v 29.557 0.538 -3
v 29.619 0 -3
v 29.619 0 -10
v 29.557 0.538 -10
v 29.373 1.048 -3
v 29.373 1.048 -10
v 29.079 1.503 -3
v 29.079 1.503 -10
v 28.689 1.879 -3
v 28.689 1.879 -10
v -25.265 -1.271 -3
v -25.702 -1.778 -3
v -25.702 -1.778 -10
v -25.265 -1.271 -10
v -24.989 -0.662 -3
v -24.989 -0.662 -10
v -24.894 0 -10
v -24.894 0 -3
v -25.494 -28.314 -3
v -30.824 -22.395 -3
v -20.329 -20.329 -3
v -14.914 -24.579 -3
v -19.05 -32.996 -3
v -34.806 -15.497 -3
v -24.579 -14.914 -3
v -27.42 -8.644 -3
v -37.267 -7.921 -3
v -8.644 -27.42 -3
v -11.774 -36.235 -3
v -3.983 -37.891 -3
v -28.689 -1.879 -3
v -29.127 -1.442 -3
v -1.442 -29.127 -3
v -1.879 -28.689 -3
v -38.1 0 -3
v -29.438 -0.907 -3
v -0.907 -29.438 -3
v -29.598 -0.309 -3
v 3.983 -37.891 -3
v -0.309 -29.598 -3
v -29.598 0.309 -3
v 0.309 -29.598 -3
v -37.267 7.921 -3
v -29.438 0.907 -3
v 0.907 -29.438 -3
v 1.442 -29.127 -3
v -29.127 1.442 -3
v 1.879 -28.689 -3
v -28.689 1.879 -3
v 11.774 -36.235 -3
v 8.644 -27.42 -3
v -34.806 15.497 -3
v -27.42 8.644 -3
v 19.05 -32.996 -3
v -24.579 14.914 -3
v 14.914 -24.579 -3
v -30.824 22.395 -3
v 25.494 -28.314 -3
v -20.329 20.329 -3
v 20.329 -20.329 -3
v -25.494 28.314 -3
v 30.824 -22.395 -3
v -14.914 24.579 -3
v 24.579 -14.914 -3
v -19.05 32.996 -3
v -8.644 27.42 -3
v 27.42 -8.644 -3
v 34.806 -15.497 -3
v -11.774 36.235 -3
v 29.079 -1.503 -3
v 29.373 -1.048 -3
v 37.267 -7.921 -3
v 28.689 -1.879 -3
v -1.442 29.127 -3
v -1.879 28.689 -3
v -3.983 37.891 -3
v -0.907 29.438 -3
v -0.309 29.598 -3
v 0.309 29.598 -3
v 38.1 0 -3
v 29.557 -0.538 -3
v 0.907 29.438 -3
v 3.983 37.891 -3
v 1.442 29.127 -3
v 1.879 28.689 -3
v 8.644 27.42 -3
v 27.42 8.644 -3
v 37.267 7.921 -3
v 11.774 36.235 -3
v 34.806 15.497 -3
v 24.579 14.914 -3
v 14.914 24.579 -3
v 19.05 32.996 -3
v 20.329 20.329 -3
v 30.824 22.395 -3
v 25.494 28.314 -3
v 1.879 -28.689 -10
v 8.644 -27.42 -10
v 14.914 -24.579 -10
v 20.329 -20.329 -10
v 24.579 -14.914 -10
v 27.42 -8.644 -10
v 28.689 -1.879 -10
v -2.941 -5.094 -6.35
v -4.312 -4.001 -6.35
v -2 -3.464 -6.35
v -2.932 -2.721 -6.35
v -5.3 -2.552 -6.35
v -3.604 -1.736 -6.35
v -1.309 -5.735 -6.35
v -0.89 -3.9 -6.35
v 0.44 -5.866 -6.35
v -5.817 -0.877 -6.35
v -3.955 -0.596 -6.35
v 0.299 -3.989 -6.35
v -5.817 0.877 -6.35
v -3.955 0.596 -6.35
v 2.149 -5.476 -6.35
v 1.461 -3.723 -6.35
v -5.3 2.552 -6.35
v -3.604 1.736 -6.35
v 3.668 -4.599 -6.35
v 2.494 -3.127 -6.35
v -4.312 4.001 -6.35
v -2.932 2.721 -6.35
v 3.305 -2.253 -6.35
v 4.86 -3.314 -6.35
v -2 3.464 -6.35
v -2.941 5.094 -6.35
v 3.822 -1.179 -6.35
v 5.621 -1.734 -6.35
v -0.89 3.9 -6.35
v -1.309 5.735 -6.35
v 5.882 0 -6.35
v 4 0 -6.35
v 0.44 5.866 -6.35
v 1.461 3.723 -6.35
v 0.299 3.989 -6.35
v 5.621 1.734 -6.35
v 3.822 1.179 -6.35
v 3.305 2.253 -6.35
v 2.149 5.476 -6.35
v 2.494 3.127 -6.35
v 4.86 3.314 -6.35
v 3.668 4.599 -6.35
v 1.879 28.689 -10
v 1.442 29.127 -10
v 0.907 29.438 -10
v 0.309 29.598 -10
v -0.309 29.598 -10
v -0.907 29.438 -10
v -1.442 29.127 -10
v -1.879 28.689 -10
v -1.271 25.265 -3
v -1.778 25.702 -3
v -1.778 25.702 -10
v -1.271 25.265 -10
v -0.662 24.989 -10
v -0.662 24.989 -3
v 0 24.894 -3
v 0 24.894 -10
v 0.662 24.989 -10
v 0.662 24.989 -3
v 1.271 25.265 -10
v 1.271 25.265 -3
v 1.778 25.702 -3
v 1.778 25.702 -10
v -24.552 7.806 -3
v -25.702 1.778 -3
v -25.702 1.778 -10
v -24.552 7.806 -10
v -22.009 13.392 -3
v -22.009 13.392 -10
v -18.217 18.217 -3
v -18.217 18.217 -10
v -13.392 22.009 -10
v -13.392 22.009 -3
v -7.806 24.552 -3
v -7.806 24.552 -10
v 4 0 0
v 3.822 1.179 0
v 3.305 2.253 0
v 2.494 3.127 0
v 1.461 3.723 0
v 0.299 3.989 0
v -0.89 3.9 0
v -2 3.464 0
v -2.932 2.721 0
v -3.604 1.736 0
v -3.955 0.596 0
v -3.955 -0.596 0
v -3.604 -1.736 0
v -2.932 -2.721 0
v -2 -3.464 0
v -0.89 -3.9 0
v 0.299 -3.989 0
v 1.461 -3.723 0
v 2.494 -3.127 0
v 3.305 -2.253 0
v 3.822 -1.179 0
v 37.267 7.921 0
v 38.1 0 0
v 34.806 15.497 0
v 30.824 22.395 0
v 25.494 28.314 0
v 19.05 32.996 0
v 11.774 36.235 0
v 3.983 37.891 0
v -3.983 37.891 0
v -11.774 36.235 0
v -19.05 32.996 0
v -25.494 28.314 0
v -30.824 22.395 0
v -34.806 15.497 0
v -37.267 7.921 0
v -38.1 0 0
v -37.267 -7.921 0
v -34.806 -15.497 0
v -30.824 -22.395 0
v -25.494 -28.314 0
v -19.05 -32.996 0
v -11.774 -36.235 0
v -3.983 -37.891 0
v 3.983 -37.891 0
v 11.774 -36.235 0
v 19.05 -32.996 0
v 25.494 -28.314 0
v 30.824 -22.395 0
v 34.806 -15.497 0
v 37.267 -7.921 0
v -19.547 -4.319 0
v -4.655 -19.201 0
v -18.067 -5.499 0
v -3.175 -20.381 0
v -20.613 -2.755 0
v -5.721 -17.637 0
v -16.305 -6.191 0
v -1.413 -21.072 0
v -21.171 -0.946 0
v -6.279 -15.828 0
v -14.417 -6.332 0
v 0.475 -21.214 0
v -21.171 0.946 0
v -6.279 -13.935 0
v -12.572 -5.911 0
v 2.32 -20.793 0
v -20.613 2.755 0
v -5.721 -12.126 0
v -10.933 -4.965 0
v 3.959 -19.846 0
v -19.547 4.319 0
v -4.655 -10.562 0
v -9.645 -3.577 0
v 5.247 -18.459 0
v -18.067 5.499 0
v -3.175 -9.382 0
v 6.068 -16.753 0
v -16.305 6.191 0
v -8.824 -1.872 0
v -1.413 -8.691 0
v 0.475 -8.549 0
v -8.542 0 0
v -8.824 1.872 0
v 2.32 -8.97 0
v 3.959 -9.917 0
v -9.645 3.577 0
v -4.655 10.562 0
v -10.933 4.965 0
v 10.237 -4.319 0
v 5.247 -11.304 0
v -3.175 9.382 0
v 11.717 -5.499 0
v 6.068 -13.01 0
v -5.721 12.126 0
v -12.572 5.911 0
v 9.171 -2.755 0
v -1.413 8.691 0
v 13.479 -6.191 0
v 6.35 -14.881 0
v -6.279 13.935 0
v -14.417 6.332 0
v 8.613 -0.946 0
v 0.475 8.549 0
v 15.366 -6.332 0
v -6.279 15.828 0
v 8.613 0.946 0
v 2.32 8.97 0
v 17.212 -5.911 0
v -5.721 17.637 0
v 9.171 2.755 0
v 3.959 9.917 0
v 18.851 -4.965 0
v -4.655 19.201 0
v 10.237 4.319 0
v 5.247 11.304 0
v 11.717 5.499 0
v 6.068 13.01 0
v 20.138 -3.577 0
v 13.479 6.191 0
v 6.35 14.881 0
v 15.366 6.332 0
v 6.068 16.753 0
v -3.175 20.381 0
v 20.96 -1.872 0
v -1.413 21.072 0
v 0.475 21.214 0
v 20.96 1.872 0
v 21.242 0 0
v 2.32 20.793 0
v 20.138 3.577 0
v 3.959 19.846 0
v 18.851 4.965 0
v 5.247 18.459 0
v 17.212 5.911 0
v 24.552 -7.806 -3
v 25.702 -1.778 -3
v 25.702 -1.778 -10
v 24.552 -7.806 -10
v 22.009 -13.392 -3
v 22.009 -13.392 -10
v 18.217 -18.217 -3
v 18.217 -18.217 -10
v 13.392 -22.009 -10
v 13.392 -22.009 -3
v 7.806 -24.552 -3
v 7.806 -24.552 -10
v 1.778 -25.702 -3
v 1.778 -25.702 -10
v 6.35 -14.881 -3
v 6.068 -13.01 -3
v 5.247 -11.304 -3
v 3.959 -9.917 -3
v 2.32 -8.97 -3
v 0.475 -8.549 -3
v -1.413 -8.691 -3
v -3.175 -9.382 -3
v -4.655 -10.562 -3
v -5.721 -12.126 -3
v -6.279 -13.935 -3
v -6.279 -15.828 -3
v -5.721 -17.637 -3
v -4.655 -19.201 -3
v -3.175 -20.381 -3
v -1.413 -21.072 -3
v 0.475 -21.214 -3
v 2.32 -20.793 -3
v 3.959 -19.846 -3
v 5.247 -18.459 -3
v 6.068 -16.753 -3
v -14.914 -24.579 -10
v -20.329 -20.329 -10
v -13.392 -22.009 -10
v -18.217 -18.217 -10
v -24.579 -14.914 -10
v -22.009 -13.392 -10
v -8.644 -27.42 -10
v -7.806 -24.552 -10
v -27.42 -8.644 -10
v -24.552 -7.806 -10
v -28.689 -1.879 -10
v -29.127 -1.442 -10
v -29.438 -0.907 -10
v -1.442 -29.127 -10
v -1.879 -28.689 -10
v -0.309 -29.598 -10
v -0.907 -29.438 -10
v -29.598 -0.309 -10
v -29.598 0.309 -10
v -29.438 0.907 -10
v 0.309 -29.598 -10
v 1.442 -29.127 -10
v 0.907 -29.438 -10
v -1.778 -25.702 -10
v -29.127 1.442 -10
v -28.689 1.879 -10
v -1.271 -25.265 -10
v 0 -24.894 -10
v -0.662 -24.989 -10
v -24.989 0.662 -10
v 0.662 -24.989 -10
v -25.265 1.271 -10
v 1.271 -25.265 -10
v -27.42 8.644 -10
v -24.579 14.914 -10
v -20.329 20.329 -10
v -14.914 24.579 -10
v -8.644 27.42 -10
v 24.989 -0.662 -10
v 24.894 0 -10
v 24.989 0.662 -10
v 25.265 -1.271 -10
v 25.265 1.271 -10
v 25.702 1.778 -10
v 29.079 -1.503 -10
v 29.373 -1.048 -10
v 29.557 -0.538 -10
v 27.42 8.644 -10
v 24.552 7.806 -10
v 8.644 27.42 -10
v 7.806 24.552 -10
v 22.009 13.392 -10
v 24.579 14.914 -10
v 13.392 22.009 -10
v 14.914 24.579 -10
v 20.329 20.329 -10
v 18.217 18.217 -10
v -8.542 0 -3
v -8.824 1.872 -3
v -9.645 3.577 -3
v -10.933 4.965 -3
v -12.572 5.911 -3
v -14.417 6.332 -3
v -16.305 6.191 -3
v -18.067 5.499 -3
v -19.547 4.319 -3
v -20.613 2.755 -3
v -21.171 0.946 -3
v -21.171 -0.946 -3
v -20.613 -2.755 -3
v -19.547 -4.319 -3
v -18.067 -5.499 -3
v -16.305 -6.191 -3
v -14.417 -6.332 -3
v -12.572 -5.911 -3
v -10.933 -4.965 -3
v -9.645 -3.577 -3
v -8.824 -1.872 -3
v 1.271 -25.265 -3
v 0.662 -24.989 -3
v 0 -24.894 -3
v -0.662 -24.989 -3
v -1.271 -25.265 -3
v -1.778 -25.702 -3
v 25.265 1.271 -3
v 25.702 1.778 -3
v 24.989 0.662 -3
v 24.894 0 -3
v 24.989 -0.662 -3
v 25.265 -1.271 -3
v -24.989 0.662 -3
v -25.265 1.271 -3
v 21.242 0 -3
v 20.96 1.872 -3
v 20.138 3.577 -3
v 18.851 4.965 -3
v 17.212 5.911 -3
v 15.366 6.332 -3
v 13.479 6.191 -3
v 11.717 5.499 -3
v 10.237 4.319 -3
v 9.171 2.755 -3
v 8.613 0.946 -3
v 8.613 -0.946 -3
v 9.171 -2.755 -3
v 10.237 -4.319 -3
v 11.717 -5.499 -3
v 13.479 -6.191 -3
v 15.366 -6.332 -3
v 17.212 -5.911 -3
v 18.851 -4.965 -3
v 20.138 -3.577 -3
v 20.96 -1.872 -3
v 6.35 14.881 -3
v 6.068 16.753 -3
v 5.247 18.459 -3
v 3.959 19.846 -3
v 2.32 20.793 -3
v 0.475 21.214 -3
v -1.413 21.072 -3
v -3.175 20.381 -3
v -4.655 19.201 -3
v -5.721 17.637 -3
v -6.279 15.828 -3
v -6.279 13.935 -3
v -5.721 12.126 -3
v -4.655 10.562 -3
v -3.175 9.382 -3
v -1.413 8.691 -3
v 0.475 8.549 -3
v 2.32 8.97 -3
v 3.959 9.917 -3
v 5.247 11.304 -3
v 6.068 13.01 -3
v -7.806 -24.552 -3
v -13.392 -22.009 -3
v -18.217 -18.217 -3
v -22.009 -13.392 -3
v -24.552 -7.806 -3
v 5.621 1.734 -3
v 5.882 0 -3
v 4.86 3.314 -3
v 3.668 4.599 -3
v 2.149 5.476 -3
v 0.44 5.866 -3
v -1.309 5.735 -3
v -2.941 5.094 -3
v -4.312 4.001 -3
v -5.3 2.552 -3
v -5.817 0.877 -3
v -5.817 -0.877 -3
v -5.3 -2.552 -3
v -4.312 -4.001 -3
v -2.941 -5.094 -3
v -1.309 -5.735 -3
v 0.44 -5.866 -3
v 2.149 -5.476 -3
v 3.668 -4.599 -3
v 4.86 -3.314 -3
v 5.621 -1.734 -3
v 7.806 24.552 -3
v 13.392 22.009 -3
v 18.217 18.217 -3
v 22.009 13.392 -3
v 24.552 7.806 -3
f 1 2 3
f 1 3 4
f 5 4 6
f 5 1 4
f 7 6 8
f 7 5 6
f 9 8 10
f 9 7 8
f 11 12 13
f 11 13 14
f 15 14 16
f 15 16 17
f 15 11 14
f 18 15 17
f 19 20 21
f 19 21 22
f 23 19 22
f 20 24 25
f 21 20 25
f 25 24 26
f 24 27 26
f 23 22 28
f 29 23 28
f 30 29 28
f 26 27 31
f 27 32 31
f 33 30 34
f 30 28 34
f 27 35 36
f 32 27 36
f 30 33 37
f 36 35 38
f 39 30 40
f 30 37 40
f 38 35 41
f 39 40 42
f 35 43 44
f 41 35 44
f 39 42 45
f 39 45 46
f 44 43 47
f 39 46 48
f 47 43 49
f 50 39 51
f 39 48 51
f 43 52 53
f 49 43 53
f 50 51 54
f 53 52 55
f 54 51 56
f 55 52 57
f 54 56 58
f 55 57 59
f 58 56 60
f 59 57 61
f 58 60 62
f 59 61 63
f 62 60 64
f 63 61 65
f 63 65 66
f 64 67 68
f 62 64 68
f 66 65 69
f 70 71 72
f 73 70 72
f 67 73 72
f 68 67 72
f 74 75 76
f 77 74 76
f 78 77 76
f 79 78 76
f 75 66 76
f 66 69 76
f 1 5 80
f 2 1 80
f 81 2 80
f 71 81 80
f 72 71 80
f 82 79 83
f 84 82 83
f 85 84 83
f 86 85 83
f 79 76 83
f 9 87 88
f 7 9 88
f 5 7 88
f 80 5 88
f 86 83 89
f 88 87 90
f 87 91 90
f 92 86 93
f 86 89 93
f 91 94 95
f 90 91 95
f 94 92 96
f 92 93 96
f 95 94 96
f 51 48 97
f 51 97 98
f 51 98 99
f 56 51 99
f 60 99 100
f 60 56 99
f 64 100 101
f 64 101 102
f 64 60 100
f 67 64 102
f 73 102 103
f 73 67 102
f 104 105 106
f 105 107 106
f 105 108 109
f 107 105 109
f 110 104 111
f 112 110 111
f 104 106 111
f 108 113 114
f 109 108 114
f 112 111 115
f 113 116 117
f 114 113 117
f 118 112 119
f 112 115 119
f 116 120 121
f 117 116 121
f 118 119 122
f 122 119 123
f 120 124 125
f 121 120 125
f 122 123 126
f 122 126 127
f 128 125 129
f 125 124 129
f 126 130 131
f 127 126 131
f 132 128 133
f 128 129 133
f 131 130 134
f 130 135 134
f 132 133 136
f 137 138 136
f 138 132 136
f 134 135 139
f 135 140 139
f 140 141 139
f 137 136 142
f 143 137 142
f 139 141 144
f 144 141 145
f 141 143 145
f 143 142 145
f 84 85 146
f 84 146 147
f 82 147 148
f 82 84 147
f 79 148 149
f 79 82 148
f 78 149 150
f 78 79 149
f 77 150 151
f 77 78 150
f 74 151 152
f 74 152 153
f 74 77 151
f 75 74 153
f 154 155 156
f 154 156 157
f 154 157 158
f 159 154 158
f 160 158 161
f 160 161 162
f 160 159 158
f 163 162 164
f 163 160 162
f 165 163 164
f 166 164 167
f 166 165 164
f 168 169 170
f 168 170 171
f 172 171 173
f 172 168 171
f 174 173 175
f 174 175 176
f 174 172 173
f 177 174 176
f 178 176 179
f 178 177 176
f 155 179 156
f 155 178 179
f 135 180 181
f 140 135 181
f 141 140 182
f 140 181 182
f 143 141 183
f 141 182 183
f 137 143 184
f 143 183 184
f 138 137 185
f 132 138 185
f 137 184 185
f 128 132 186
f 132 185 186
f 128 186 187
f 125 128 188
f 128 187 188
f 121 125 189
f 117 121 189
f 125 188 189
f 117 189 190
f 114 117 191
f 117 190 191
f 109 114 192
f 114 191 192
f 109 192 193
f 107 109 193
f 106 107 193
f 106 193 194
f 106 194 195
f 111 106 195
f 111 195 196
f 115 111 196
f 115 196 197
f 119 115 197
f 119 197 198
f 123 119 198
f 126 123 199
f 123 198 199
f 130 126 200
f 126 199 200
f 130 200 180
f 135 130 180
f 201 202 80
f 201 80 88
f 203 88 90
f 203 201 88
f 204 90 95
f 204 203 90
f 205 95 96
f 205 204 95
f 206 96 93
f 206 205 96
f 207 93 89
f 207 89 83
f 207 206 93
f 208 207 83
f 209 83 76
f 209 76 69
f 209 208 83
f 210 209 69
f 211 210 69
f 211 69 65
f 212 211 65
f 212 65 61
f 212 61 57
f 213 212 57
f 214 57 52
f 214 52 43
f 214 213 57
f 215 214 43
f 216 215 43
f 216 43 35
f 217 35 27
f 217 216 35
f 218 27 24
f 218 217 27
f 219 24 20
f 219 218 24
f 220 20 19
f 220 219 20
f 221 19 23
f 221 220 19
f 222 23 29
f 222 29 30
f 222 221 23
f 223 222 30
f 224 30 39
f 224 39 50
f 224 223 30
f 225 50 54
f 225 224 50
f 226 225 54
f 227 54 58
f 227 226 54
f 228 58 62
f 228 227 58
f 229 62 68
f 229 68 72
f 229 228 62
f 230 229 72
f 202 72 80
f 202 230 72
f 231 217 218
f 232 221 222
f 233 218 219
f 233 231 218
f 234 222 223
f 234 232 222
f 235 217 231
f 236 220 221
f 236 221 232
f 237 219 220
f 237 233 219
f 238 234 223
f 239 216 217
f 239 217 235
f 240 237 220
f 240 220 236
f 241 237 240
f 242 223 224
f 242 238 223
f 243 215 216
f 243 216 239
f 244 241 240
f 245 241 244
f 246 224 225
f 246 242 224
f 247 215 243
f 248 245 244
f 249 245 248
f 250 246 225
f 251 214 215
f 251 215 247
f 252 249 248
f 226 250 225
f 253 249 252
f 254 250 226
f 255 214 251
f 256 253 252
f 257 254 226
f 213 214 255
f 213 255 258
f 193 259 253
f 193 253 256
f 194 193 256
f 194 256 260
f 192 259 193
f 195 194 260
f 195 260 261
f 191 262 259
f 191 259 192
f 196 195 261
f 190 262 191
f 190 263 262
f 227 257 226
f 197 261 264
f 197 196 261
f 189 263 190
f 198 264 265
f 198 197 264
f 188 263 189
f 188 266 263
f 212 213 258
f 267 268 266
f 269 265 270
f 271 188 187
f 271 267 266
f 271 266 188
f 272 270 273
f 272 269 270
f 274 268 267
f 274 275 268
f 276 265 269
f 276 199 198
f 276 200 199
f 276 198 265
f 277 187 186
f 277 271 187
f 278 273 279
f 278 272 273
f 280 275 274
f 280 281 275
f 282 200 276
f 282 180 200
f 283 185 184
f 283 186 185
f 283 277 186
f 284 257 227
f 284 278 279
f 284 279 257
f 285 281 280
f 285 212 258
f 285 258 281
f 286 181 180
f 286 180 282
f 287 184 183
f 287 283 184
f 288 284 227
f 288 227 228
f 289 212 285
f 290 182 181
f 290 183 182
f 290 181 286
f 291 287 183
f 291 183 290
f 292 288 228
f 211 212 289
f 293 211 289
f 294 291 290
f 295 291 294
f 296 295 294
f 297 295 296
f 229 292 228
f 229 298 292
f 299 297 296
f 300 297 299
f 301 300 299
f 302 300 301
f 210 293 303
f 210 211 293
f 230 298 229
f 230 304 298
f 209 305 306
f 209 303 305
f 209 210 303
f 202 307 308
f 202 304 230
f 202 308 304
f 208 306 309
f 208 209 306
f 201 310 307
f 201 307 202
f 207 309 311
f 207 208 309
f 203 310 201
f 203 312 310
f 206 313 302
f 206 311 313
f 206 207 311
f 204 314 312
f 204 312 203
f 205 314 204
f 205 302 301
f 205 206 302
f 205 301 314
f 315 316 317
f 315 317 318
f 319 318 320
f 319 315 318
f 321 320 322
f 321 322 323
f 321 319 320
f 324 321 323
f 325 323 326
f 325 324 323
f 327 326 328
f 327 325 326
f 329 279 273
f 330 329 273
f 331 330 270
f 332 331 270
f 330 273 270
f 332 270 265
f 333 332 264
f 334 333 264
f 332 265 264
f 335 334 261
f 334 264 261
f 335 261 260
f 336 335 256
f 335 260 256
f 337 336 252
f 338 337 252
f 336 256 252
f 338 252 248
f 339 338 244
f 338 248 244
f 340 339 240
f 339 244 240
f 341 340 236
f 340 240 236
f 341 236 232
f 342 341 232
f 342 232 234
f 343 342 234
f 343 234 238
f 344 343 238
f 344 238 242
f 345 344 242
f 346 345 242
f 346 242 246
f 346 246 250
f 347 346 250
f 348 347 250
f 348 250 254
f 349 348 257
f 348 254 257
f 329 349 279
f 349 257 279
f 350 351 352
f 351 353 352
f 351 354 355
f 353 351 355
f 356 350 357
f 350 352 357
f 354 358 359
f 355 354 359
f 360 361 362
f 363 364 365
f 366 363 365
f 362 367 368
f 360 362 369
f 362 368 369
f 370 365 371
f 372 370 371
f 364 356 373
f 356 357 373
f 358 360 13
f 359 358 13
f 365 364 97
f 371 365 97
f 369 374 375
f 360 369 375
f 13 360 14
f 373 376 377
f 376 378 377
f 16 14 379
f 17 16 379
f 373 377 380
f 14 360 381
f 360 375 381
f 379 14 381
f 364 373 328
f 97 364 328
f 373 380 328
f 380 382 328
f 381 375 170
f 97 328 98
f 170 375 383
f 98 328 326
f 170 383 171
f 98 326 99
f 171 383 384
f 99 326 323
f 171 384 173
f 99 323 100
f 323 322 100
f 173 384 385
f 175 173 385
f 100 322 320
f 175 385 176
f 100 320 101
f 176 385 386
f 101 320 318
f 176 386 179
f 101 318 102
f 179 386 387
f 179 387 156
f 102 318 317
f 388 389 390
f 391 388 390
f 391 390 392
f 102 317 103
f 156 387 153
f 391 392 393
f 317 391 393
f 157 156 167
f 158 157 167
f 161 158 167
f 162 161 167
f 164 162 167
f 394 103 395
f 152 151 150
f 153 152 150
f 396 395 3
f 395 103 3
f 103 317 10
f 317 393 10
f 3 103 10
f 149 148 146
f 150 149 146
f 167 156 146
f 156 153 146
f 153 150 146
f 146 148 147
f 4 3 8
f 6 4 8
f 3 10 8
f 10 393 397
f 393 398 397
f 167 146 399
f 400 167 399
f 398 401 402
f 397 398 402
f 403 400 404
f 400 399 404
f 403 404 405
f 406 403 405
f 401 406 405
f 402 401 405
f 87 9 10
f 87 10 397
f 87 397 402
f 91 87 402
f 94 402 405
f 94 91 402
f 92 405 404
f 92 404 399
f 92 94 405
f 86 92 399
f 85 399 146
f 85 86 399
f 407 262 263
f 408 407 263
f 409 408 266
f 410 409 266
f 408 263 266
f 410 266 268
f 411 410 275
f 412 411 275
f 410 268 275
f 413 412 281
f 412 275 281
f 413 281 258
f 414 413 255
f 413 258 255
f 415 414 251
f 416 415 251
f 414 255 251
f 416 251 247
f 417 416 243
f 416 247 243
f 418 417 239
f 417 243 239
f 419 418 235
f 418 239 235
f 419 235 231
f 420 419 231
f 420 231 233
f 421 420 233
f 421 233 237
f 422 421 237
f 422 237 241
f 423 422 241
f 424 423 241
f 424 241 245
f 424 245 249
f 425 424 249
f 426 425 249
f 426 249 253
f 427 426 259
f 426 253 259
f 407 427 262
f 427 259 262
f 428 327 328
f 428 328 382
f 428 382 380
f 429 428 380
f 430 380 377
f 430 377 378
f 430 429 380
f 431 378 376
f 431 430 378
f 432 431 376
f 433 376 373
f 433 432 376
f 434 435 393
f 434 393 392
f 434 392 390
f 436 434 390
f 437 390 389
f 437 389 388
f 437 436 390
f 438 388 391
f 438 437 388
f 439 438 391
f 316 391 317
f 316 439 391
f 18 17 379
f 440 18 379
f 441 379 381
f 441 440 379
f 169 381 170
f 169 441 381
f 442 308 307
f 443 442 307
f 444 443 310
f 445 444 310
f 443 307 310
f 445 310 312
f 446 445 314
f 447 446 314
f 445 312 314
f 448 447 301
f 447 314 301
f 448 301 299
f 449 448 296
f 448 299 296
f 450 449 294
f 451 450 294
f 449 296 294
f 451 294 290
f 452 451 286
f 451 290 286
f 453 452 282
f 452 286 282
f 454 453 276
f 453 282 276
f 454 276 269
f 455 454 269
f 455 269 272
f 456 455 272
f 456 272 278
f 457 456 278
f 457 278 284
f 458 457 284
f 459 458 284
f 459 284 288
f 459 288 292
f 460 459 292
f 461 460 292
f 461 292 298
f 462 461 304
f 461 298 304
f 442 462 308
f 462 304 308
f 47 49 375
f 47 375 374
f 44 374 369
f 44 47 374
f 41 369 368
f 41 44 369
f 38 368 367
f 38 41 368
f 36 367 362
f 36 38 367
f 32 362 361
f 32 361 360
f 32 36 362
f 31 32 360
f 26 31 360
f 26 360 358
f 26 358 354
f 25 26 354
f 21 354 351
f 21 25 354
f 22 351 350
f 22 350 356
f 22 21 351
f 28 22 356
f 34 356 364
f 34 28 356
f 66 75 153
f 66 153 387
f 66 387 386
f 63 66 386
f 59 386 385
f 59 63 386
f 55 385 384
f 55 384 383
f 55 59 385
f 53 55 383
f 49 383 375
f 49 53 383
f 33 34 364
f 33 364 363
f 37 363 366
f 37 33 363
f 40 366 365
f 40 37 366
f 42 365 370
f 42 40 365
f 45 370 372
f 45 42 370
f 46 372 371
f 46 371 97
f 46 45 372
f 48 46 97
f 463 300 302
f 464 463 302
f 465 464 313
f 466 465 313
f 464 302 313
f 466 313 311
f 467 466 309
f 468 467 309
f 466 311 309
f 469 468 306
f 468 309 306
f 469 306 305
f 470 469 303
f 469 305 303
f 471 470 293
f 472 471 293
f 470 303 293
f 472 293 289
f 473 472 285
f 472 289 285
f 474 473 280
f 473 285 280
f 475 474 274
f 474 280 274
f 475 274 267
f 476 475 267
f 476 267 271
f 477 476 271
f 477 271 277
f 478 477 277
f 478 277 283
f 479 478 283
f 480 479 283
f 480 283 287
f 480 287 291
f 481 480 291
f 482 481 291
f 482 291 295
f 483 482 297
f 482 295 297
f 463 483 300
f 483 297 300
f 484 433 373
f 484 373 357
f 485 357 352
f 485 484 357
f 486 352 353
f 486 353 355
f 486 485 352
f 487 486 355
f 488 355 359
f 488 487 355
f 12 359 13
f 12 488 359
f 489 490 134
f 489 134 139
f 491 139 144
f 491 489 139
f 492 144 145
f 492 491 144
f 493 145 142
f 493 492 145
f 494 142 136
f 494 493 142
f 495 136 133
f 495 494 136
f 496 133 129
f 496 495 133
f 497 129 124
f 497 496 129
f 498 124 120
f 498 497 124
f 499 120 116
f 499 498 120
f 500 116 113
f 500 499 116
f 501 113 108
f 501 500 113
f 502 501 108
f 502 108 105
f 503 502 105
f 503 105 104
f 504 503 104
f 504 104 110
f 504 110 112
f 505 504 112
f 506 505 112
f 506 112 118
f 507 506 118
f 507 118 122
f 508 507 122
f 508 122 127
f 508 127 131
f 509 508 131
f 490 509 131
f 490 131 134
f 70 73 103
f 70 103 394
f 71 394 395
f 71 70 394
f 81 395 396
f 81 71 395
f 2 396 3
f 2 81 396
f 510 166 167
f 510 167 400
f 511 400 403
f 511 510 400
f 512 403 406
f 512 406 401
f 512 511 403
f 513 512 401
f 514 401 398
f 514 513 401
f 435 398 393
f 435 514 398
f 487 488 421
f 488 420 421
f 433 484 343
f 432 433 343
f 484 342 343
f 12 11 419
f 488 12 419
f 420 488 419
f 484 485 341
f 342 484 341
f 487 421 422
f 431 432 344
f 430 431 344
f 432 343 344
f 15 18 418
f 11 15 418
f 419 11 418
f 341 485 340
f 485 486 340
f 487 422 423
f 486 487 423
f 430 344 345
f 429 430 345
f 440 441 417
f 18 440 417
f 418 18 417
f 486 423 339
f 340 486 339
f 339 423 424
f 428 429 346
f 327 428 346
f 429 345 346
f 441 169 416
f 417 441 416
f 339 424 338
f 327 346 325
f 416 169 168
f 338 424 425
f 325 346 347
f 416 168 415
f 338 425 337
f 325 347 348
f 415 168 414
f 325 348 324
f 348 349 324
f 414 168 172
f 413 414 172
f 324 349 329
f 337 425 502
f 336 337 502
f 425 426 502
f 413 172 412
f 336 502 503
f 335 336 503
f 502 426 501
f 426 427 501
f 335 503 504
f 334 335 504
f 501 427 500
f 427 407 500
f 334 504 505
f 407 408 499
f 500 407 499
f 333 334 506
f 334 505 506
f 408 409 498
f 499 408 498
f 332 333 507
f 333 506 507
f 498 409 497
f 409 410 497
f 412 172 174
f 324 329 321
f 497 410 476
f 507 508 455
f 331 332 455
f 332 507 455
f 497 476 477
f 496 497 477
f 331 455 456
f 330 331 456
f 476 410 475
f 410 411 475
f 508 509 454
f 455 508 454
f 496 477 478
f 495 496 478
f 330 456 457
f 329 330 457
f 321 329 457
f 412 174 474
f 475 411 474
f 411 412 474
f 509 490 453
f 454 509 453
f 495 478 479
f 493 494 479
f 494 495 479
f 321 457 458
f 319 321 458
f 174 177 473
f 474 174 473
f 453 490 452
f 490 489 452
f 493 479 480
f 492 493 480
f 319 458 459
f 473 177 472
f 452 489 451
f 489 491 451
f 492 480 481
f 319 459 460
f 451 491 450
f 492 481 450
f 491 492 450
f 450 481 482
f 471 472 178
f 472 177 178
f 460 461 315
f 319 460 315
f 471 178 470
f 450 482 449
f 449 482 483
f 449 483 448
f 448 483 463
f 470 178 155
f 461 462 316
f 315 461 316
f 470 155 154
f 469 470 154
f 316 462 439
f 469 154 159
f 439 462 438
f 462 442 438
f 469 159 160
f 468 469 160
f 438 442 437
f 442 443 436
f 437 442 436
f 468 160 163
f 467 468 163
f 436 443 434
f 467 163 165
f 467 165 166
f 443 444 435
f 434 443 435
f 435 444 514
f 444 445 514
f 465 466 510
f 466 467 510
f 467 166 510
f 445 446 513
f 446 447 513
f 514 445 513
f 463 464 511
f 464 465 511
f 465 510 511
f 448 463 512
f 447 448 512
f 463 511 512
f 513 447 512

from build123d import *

# Parameters (mm, degrees)
F1_DEPTH = 10
F0_R     = 38.1
F0_R_2   = 6.35
F0_R_3   = 5.8823611715
F2_DEPTH = 3
F0_R_4   = 4
F3_DEPTH = 6.35


with BuildPart() as f1:
    # F0 (on Top) → F1 (new body)
    with BuildSketch(Plane.XY):
        with BuildLine():
            Line((25.7629516235, 0), (28.75, 0))
            ThreePointArc((28.75, 0), (28.7346354423, 0.9398010419), (28.6885581914, 1.878597588))
            ThreePointArc((28.6885581914, 1.878597588), (27.1771412956, 2.3608673988), (25.7015098149, 1.7782209055))
            ThreePointArc((25.7015098149, 1.7782209055), (25.7475865895, 0.889641035), (25.7629516235, 0))
        make_face()
        with BuildLine():
            ThreePointArc((28.6885581914, 1.878597588), (28.7346354423, 0.9398010419), (28.75, 0))
            ThreePointArc((28.75, 0), (28.7346354423, -0.9398010419), (28.6885581914, -1.878597588))
            ThreePointArc((28.6885581914, -1.878597588), (29.3734139116, -1.0481230469), (29.6186758117, 0))
            ThreePointArc((29.6186758117, 0), (29.3734139116, 1.0481230469), (28.6885581914, 1.878597588))
        make_face()
        with BuildLine():
            ThreePointArc((28.6885581914, -1.878597588), (28.7346354423, -0.9398010419), (28.75, 0))
            Line((28.75, 0), (25.7629516235, 0))
            ThreePointArc((25.7629516235, 0), (25.7475865895, -0.889641035), (25.7015098149, -1.7782209055))
            ThreePointArc((25.7015098149, -1.7782209055), (27.1771412956, -2.3608673988), (28.6885581914, -1.878597588))
        make_face()
        with BuildLine():
            ThreePointArc((25.7015098149, 1.7782209055), (27.1771412956, 2.3608673988), (28.6885581914, 1.878597588))
            ThreePointArc((28.6885581914, 1.878597588), (20.3293199591, 20.3293199591), (1.878597588, 28.6885581914))
            ThreePointArc((1.878597588, 28.6885581914), (2.2380361997, 28.0122421835), (2.3622, 27.2564758117))
            ThreePointArc((2.3622, 27.2564758117), (2.2113912208, 26.4259713213), (1.7782209055, 25.7015098149))
            ThreePointArc((1.7782209055, 25.7015098149), (18.2171577963, 18.2171577963), (25.7015098149, 1.7782209055))
        make_face()
        with BuildLine():
            ThreePointArc((1.878597588, -28.6885581914), (20.3293199591, -20.3293199591), (28.6885581914, -1.878597588))
            ThreePointArc((28.6885581914, -1.878597588), (27.1771412956, -2.3608673988), (25.7015098149, -1.7782209055))
            ThreePointArc((25.7015098149, -1.7782209055), (18.2171577963, -18.2171577963), (1.7782209055, -25.7015098149))
            ThreePointArc((1.7782209055, -25.7015098149), (2.2113912208, -26.4259713213), (2.3622, -27.2564758117))
            ThreePointArc((2.3622, -27.2564758117), (2.2380361997, -28.0122421835), (1.878597588, -28.6885581914))
        make_face()
        with BuildLine():
            ThreePointArc((25.7015098149, -1.7782209055), (25.7475865895, -0.889641035), (25.7629516235, 0))
            ThreePointArc((25.7629516235, 0), (25.7475865895, 0.889641035), (25.7015098149, 1.7782209055))
            ThreePointArc((25.7015098149, 1.7782209055), (24.8942758117, 0), (25.7015098149, -1.7782209055))
        make_face()
        with BuildLine():
            ThreePointArc((2.3622, 27.2564758117), (2.2380361997, 28.0122421835), (1.878597588, 28.6885581914))
            ThreePointArc((1.878597588, 28.6885581914), (0.9398010419, 28.7346354423), (0, 28.75))
            Line((0, 28.75), (0, 25.7629516235))
            ThreePointArc((0, 25.7629516235), (0.889641035, 25.7475865895), (1.7782209055, 25.7015098149))
            ThreePointArc((1.7782209055, 25.7015098149), (2.2113912208, 26.4259713213), (2.3622, 27.2564758117))
        make_face()
        with BuildLine():
            ThreePointArc((0, 28.75), (0.9398010419, 28.7346354423), (1.878597588, 28.6885581914))
            ThreePointArc((1.878597588, 28.6885581914), (0, 29.6186758117), (-1.878597588, 28.6885581914))
            ThreePointArc((-1.878597588, 28.6885581914), (-0.9398010419, 28.7346354423), (0, 28.75))
        make_face()
        with BuildLine():
            ThreePointArc((-1.878597588, -28.6885581914), (0, -29.6186758117), (1.878597588, -28.6885581914))
            ThreePointArc((1.878597588, -28.6885581914), (0.9398010419, -28.7346354423), (0, -28.75))
            ThreePointArc((0, -28.75), (-0.9398010419, -28.7346354423), (-1.878597588, -28.6885581914))
        make_face()
        with BuildLine():
            ThreePointArc((0, -28.75), (0.9398010419, -28.7346354423), (1.878597588, -28.6885581914))
            ThreePointArc((1.878597588, -28.6885581914), (2.2380361997, -28.0122421835), (2.3622, -27.2564758117))
            ThreePointArc((2.3622, -27.2564758117), (2.2113912208, -26.4259713213), (1.7782209055, -25.7015098149))
            ThreePointArc((1.7782209055, -25.7015098149), (0.889641035, -25.7475865895), (0, -25.7629516235))
            Line((0, -25.7629516235), (0, -28.75))
        make_face()
        with BuildLine():
            Line((0, 25.7629516235), (0, 28.75))
            ThreePointArc((0, 28.75), (-0.9398010419, 28.7346354423), (-1.878597588, 28.6885581914))
            ThreePointArc((-1.878597588, 28.6885581914), (-2.3608673988, 27.1771412956), (-1.7782209055, 25.7015098149))
            ThreePointArc((-1.7782209055, 25.7015098149), (-0.889641035, 25.7475865895), (0, 25.7629516235))
        make_face()
        with BuildLine():
            ThreePointArc((-1.7782209055, 25.7015098149), (-2.3608673988, 27.1771412956), (-1.878597588, 28.6885581914))
            ThreePointArc((-1.878597588, 28.6885581914), (-20.3293199591, 20.3293199591), (-28.6885581914, 1.878597588))
            ThreePointArc((-28.6885581914, 1.878597588), (-27.1771412956, 2.3608673988), (-25.7015098149, 1.7782209055))
            ThreePointArc((-25.7015098149, 1.7782209055), (-18.2171577963, 18.2171577963), (-1.7782209055, 25.7015098149))
        make_face()
        with BuildLine():
            ThreePointArc((-1.7782209055, 25.7015098149), (0, 24.8942758117), (1.7782209055, 25.7015098149))
            ThreePointArc((1.7782209055, 25.7015098149), (0.889641035, 25.7475865895), (0, 25.7629516235))
            ThreePointArc((0, 25.7629516235), (-0.889641035, 25.7475865895), (-1.7782209055, 25.7015098149))
        make_face()
        with BuildLine():
            ThreePointArc((-1.878597588, -28.6885581914), (-0.9398010419, -28.7346354423), (0, -28.75))
            Line((0, -28.75), (0, -25.7629516235))
            ThreePointArc((0, -25.7629516235), (-0.889641035, -25.7475865895), (-1.7782209055, -25.7015098149))
            ThreePointArc((-1.7782209055, -25.7015098149), (-2.3608673988, -27.1771412956), (-1.878597588, -28.6885581914))
        make_face()
        with BuildLine():
            ThreePointArc((-28.6885581914, -1.878597588), (-20.3293199591, -20.3293199591), (-1.878597588, -28.6885581914))
            ThreePointArc((-1.878597588, -28.6885581914), (-2.3608673988, -27.1771412956), (-1.7782209055, -25.7015098149))
            ThreePointArc((-1.7782209055, -25.7015098149), (-18.2171577963, -18.2171577963), (-25.7015098149, -1.7782209055))
            ThreePointArc((-25.7015098149, -1.7782209055), (-27.1771412956, -2.3608673988), (-28.6885581914, -1.878597588))
        make_face()
        with BuildLine():
            ThreePointArc((0, -25.7629516235), (0.889641035, -25.7475865895), (1.7782209055, -25.7015098149))
            ThreePointArc((1.7782209055, -25.7015098149), (0, -24.8942758117), (-1.7782209055, -25.7015098149))
            ThreePointArc((-1.7782209055, -25.7015098149), (-0.889641035, -25.7475865895), (0, -25.7629516235))
        make_face()
        with BuildLine():
            ThreePointArc((-25.7015098149, 1.7782209055), (-27.1771412956, 2.3608673988), (-28.6885581914, 1.878597588))
            ThreePointArc((-28.6885581914, 1.878597588), (-28.7346354423, 0.9398010419), (-28.75, 0))
            Line((-28.75, 0), (-25.7629516235, 0))
            ThreePointArc((-25.7629516235, 0), (-25.7475865895, 0.889641035), (-25.7015098149, 1.7782209055))
        make_face()
        with BuildLine():
            ThreePointArc((-28.75, 0), (-28.7346354423, 0.9398010419), (-28.6885581914, 1.878597588))
            ThreePointArc((-28.6885581914, 1.878597588), (-29.6186758117, 0), (-28.6885581914, -1.878597588))
            ThreePointArc((-28.6885581914, -1.878597588), (-28.7346354423, -0.9398010419), (-28.75, 0))
        make_face()
        with BuildLine():
            ThreePointArc((-28.75, 0), (-28.7346354423, -0.9398010419), (-28.6885581914, -1.878597588))
            ThreePointArc((-28.6885581914, -1.878597588), (-27.1771412956, -2.3608673988), (-25.7015098149, -1.7782209055))
            ThreePointArc((-25.7015098149, -1.7782209055), (-25.7475865895, -0.889641035), (-25.7629516235, 0))
            Line((-25.7629516235, 0), (-28.75, 0))
        make_face()
        with BuildLine():
            ThreePointArc((-24.8942758117, 0), (-25.1055307267, 0.9764343711), (-25.7015098149, 1.7782209055))
            ThreePointArc((-25.7015098149, 1.7782209055), (-25.7475865895, 0.889641035), (-25.7629516235, 0))
            ThreePointArc((-25.7629516235, 0), (-25.7475865895, -0.889641035), (-25.7015098149, -1.7782209055))
            ThreePointArc((-25.7015098149, -1.7782209055), (-25.1055307267, -0.9764343711), (-24.8942758117, 0))
        make_face()
    extrude(amount=-F1_DEPTH)

    # F0 (on Top) → F2 (join)
    with BuildSketch(Plane.XY):
        Circle(F0_R)
        with BuildLine():
            ThreePointArc((1.878597588, 28.6885581914), (20.3293199591, 20.3293199591), (28.6885581914, 1.878597588))
            ThreePointArc((28.6885581914, 1.878597588), (29.3734139116, 1.0481230469), (29.6186758117, 0))
            ThreePointArc((29.6186758117, 0), (29.3734139116, -1.0481230469), (28.6885581914, -1.878597588))
            ThreePointArc((28.6885581914, -1.878597588), (20.3293199591, -20.3293199591), (1.878597588, -28.6885581914))
            ThreePointArc((1.878597588, -28.6885581914), (0, -29.6186758117), (-1.878597588, -28.6885581914))
            ThreePointArc((-1.878597588, -28.6885581914), (-20.3293199591, -20.3293199591), (-28.6885581914, -1.878597588))
            ThreePointArc((-28.6885581914, -1.878597588), (-29.6186758117, 0), (-28.6885581914, 1.878597588))
            ThreePointArc((-28.6885581914, 1.878597588), (-20.3293199591, 20.3293199591), (-1.878597588, 28.6885581914))
            ThreePointArc((-1.878597588, 28.6885581914), (0, 29.6186758117), (1.878597588, 28.6885581914))
        make_face(mode=Mode.SUBTRACT)
        with BuildLine():
            ThreePointArc((25.7015098149, -1.7782209055), (24.8942758117, 0), (25.7015098149, 1.7782209055))
            ThreePointArc((25.7015098149, 1.7782209055), (18.2171577963, 18.2171577963), (1.7782209055, 25.7015098149))
            ThreePointArc((1.7782209055, 25.7015098149), (0, 24.8942758117), (-1.7782209055, 25.7015098149))
            ThreePointArc((-1.7782209055, 25.7015098149), (-18.2171577963, 18.2171577963), (-25.7015098149, 1.7782209055))
            ThreePointArc((-25.7015098149, 1.7782209055), (-25.1055307267, 0.9764343711), (-24.8942758117, 0))
            ThreePointArc((-24.8942758117, 0), (-25.1055307267, -0.9764343711), (-25.7015098149, -1.7782209055))
            ThreePointArc((-25.7015098149, -1.7782209055), (-18.2171577963, -18.2171577963), (-1.7782209055, -25.7015098149))
            ThreePointArc((-1.7782209055, -25.7015098149), (0, -24.8942758117), (1.7782209055, -25.7015098149))
            ThreePointArc((1.7782209055, -25.7015098149), (18.2171577963, -18.2171577963), (25.7015098149, -1.7782209055))
        make_face()
        with Locations((0, -14.8814758117)):
            Circle(F0_R_2, mode=Mode.SUBTRACT)
        with Locations((-14.8917516235, 0)):
            Circle(F0_R_2, mode=Mode.SUBTRACT)
        Circle(F0_R_3, mode=Mode.SUBTRACT)
        with Locations((14.8917516235, 0)):
            Circle(F0_R_2, mode=Mode.SUBTRACT)
        with Locations((0, 14.8814758117)):
            Circle(F0_R_2, mode=Mode.SUBTRACT)
    extrude(amount=-F2_DEPTH)

    # F0 (on Top) → F3 (join)
    with BuildSketch(Plane.XY):
        Circle(F0_R_3)
        Circle(F0_R_4, mode=Mode.SUBTRACT)
    extrude(amount=-F3_DEPTH)


solid = f1.part
